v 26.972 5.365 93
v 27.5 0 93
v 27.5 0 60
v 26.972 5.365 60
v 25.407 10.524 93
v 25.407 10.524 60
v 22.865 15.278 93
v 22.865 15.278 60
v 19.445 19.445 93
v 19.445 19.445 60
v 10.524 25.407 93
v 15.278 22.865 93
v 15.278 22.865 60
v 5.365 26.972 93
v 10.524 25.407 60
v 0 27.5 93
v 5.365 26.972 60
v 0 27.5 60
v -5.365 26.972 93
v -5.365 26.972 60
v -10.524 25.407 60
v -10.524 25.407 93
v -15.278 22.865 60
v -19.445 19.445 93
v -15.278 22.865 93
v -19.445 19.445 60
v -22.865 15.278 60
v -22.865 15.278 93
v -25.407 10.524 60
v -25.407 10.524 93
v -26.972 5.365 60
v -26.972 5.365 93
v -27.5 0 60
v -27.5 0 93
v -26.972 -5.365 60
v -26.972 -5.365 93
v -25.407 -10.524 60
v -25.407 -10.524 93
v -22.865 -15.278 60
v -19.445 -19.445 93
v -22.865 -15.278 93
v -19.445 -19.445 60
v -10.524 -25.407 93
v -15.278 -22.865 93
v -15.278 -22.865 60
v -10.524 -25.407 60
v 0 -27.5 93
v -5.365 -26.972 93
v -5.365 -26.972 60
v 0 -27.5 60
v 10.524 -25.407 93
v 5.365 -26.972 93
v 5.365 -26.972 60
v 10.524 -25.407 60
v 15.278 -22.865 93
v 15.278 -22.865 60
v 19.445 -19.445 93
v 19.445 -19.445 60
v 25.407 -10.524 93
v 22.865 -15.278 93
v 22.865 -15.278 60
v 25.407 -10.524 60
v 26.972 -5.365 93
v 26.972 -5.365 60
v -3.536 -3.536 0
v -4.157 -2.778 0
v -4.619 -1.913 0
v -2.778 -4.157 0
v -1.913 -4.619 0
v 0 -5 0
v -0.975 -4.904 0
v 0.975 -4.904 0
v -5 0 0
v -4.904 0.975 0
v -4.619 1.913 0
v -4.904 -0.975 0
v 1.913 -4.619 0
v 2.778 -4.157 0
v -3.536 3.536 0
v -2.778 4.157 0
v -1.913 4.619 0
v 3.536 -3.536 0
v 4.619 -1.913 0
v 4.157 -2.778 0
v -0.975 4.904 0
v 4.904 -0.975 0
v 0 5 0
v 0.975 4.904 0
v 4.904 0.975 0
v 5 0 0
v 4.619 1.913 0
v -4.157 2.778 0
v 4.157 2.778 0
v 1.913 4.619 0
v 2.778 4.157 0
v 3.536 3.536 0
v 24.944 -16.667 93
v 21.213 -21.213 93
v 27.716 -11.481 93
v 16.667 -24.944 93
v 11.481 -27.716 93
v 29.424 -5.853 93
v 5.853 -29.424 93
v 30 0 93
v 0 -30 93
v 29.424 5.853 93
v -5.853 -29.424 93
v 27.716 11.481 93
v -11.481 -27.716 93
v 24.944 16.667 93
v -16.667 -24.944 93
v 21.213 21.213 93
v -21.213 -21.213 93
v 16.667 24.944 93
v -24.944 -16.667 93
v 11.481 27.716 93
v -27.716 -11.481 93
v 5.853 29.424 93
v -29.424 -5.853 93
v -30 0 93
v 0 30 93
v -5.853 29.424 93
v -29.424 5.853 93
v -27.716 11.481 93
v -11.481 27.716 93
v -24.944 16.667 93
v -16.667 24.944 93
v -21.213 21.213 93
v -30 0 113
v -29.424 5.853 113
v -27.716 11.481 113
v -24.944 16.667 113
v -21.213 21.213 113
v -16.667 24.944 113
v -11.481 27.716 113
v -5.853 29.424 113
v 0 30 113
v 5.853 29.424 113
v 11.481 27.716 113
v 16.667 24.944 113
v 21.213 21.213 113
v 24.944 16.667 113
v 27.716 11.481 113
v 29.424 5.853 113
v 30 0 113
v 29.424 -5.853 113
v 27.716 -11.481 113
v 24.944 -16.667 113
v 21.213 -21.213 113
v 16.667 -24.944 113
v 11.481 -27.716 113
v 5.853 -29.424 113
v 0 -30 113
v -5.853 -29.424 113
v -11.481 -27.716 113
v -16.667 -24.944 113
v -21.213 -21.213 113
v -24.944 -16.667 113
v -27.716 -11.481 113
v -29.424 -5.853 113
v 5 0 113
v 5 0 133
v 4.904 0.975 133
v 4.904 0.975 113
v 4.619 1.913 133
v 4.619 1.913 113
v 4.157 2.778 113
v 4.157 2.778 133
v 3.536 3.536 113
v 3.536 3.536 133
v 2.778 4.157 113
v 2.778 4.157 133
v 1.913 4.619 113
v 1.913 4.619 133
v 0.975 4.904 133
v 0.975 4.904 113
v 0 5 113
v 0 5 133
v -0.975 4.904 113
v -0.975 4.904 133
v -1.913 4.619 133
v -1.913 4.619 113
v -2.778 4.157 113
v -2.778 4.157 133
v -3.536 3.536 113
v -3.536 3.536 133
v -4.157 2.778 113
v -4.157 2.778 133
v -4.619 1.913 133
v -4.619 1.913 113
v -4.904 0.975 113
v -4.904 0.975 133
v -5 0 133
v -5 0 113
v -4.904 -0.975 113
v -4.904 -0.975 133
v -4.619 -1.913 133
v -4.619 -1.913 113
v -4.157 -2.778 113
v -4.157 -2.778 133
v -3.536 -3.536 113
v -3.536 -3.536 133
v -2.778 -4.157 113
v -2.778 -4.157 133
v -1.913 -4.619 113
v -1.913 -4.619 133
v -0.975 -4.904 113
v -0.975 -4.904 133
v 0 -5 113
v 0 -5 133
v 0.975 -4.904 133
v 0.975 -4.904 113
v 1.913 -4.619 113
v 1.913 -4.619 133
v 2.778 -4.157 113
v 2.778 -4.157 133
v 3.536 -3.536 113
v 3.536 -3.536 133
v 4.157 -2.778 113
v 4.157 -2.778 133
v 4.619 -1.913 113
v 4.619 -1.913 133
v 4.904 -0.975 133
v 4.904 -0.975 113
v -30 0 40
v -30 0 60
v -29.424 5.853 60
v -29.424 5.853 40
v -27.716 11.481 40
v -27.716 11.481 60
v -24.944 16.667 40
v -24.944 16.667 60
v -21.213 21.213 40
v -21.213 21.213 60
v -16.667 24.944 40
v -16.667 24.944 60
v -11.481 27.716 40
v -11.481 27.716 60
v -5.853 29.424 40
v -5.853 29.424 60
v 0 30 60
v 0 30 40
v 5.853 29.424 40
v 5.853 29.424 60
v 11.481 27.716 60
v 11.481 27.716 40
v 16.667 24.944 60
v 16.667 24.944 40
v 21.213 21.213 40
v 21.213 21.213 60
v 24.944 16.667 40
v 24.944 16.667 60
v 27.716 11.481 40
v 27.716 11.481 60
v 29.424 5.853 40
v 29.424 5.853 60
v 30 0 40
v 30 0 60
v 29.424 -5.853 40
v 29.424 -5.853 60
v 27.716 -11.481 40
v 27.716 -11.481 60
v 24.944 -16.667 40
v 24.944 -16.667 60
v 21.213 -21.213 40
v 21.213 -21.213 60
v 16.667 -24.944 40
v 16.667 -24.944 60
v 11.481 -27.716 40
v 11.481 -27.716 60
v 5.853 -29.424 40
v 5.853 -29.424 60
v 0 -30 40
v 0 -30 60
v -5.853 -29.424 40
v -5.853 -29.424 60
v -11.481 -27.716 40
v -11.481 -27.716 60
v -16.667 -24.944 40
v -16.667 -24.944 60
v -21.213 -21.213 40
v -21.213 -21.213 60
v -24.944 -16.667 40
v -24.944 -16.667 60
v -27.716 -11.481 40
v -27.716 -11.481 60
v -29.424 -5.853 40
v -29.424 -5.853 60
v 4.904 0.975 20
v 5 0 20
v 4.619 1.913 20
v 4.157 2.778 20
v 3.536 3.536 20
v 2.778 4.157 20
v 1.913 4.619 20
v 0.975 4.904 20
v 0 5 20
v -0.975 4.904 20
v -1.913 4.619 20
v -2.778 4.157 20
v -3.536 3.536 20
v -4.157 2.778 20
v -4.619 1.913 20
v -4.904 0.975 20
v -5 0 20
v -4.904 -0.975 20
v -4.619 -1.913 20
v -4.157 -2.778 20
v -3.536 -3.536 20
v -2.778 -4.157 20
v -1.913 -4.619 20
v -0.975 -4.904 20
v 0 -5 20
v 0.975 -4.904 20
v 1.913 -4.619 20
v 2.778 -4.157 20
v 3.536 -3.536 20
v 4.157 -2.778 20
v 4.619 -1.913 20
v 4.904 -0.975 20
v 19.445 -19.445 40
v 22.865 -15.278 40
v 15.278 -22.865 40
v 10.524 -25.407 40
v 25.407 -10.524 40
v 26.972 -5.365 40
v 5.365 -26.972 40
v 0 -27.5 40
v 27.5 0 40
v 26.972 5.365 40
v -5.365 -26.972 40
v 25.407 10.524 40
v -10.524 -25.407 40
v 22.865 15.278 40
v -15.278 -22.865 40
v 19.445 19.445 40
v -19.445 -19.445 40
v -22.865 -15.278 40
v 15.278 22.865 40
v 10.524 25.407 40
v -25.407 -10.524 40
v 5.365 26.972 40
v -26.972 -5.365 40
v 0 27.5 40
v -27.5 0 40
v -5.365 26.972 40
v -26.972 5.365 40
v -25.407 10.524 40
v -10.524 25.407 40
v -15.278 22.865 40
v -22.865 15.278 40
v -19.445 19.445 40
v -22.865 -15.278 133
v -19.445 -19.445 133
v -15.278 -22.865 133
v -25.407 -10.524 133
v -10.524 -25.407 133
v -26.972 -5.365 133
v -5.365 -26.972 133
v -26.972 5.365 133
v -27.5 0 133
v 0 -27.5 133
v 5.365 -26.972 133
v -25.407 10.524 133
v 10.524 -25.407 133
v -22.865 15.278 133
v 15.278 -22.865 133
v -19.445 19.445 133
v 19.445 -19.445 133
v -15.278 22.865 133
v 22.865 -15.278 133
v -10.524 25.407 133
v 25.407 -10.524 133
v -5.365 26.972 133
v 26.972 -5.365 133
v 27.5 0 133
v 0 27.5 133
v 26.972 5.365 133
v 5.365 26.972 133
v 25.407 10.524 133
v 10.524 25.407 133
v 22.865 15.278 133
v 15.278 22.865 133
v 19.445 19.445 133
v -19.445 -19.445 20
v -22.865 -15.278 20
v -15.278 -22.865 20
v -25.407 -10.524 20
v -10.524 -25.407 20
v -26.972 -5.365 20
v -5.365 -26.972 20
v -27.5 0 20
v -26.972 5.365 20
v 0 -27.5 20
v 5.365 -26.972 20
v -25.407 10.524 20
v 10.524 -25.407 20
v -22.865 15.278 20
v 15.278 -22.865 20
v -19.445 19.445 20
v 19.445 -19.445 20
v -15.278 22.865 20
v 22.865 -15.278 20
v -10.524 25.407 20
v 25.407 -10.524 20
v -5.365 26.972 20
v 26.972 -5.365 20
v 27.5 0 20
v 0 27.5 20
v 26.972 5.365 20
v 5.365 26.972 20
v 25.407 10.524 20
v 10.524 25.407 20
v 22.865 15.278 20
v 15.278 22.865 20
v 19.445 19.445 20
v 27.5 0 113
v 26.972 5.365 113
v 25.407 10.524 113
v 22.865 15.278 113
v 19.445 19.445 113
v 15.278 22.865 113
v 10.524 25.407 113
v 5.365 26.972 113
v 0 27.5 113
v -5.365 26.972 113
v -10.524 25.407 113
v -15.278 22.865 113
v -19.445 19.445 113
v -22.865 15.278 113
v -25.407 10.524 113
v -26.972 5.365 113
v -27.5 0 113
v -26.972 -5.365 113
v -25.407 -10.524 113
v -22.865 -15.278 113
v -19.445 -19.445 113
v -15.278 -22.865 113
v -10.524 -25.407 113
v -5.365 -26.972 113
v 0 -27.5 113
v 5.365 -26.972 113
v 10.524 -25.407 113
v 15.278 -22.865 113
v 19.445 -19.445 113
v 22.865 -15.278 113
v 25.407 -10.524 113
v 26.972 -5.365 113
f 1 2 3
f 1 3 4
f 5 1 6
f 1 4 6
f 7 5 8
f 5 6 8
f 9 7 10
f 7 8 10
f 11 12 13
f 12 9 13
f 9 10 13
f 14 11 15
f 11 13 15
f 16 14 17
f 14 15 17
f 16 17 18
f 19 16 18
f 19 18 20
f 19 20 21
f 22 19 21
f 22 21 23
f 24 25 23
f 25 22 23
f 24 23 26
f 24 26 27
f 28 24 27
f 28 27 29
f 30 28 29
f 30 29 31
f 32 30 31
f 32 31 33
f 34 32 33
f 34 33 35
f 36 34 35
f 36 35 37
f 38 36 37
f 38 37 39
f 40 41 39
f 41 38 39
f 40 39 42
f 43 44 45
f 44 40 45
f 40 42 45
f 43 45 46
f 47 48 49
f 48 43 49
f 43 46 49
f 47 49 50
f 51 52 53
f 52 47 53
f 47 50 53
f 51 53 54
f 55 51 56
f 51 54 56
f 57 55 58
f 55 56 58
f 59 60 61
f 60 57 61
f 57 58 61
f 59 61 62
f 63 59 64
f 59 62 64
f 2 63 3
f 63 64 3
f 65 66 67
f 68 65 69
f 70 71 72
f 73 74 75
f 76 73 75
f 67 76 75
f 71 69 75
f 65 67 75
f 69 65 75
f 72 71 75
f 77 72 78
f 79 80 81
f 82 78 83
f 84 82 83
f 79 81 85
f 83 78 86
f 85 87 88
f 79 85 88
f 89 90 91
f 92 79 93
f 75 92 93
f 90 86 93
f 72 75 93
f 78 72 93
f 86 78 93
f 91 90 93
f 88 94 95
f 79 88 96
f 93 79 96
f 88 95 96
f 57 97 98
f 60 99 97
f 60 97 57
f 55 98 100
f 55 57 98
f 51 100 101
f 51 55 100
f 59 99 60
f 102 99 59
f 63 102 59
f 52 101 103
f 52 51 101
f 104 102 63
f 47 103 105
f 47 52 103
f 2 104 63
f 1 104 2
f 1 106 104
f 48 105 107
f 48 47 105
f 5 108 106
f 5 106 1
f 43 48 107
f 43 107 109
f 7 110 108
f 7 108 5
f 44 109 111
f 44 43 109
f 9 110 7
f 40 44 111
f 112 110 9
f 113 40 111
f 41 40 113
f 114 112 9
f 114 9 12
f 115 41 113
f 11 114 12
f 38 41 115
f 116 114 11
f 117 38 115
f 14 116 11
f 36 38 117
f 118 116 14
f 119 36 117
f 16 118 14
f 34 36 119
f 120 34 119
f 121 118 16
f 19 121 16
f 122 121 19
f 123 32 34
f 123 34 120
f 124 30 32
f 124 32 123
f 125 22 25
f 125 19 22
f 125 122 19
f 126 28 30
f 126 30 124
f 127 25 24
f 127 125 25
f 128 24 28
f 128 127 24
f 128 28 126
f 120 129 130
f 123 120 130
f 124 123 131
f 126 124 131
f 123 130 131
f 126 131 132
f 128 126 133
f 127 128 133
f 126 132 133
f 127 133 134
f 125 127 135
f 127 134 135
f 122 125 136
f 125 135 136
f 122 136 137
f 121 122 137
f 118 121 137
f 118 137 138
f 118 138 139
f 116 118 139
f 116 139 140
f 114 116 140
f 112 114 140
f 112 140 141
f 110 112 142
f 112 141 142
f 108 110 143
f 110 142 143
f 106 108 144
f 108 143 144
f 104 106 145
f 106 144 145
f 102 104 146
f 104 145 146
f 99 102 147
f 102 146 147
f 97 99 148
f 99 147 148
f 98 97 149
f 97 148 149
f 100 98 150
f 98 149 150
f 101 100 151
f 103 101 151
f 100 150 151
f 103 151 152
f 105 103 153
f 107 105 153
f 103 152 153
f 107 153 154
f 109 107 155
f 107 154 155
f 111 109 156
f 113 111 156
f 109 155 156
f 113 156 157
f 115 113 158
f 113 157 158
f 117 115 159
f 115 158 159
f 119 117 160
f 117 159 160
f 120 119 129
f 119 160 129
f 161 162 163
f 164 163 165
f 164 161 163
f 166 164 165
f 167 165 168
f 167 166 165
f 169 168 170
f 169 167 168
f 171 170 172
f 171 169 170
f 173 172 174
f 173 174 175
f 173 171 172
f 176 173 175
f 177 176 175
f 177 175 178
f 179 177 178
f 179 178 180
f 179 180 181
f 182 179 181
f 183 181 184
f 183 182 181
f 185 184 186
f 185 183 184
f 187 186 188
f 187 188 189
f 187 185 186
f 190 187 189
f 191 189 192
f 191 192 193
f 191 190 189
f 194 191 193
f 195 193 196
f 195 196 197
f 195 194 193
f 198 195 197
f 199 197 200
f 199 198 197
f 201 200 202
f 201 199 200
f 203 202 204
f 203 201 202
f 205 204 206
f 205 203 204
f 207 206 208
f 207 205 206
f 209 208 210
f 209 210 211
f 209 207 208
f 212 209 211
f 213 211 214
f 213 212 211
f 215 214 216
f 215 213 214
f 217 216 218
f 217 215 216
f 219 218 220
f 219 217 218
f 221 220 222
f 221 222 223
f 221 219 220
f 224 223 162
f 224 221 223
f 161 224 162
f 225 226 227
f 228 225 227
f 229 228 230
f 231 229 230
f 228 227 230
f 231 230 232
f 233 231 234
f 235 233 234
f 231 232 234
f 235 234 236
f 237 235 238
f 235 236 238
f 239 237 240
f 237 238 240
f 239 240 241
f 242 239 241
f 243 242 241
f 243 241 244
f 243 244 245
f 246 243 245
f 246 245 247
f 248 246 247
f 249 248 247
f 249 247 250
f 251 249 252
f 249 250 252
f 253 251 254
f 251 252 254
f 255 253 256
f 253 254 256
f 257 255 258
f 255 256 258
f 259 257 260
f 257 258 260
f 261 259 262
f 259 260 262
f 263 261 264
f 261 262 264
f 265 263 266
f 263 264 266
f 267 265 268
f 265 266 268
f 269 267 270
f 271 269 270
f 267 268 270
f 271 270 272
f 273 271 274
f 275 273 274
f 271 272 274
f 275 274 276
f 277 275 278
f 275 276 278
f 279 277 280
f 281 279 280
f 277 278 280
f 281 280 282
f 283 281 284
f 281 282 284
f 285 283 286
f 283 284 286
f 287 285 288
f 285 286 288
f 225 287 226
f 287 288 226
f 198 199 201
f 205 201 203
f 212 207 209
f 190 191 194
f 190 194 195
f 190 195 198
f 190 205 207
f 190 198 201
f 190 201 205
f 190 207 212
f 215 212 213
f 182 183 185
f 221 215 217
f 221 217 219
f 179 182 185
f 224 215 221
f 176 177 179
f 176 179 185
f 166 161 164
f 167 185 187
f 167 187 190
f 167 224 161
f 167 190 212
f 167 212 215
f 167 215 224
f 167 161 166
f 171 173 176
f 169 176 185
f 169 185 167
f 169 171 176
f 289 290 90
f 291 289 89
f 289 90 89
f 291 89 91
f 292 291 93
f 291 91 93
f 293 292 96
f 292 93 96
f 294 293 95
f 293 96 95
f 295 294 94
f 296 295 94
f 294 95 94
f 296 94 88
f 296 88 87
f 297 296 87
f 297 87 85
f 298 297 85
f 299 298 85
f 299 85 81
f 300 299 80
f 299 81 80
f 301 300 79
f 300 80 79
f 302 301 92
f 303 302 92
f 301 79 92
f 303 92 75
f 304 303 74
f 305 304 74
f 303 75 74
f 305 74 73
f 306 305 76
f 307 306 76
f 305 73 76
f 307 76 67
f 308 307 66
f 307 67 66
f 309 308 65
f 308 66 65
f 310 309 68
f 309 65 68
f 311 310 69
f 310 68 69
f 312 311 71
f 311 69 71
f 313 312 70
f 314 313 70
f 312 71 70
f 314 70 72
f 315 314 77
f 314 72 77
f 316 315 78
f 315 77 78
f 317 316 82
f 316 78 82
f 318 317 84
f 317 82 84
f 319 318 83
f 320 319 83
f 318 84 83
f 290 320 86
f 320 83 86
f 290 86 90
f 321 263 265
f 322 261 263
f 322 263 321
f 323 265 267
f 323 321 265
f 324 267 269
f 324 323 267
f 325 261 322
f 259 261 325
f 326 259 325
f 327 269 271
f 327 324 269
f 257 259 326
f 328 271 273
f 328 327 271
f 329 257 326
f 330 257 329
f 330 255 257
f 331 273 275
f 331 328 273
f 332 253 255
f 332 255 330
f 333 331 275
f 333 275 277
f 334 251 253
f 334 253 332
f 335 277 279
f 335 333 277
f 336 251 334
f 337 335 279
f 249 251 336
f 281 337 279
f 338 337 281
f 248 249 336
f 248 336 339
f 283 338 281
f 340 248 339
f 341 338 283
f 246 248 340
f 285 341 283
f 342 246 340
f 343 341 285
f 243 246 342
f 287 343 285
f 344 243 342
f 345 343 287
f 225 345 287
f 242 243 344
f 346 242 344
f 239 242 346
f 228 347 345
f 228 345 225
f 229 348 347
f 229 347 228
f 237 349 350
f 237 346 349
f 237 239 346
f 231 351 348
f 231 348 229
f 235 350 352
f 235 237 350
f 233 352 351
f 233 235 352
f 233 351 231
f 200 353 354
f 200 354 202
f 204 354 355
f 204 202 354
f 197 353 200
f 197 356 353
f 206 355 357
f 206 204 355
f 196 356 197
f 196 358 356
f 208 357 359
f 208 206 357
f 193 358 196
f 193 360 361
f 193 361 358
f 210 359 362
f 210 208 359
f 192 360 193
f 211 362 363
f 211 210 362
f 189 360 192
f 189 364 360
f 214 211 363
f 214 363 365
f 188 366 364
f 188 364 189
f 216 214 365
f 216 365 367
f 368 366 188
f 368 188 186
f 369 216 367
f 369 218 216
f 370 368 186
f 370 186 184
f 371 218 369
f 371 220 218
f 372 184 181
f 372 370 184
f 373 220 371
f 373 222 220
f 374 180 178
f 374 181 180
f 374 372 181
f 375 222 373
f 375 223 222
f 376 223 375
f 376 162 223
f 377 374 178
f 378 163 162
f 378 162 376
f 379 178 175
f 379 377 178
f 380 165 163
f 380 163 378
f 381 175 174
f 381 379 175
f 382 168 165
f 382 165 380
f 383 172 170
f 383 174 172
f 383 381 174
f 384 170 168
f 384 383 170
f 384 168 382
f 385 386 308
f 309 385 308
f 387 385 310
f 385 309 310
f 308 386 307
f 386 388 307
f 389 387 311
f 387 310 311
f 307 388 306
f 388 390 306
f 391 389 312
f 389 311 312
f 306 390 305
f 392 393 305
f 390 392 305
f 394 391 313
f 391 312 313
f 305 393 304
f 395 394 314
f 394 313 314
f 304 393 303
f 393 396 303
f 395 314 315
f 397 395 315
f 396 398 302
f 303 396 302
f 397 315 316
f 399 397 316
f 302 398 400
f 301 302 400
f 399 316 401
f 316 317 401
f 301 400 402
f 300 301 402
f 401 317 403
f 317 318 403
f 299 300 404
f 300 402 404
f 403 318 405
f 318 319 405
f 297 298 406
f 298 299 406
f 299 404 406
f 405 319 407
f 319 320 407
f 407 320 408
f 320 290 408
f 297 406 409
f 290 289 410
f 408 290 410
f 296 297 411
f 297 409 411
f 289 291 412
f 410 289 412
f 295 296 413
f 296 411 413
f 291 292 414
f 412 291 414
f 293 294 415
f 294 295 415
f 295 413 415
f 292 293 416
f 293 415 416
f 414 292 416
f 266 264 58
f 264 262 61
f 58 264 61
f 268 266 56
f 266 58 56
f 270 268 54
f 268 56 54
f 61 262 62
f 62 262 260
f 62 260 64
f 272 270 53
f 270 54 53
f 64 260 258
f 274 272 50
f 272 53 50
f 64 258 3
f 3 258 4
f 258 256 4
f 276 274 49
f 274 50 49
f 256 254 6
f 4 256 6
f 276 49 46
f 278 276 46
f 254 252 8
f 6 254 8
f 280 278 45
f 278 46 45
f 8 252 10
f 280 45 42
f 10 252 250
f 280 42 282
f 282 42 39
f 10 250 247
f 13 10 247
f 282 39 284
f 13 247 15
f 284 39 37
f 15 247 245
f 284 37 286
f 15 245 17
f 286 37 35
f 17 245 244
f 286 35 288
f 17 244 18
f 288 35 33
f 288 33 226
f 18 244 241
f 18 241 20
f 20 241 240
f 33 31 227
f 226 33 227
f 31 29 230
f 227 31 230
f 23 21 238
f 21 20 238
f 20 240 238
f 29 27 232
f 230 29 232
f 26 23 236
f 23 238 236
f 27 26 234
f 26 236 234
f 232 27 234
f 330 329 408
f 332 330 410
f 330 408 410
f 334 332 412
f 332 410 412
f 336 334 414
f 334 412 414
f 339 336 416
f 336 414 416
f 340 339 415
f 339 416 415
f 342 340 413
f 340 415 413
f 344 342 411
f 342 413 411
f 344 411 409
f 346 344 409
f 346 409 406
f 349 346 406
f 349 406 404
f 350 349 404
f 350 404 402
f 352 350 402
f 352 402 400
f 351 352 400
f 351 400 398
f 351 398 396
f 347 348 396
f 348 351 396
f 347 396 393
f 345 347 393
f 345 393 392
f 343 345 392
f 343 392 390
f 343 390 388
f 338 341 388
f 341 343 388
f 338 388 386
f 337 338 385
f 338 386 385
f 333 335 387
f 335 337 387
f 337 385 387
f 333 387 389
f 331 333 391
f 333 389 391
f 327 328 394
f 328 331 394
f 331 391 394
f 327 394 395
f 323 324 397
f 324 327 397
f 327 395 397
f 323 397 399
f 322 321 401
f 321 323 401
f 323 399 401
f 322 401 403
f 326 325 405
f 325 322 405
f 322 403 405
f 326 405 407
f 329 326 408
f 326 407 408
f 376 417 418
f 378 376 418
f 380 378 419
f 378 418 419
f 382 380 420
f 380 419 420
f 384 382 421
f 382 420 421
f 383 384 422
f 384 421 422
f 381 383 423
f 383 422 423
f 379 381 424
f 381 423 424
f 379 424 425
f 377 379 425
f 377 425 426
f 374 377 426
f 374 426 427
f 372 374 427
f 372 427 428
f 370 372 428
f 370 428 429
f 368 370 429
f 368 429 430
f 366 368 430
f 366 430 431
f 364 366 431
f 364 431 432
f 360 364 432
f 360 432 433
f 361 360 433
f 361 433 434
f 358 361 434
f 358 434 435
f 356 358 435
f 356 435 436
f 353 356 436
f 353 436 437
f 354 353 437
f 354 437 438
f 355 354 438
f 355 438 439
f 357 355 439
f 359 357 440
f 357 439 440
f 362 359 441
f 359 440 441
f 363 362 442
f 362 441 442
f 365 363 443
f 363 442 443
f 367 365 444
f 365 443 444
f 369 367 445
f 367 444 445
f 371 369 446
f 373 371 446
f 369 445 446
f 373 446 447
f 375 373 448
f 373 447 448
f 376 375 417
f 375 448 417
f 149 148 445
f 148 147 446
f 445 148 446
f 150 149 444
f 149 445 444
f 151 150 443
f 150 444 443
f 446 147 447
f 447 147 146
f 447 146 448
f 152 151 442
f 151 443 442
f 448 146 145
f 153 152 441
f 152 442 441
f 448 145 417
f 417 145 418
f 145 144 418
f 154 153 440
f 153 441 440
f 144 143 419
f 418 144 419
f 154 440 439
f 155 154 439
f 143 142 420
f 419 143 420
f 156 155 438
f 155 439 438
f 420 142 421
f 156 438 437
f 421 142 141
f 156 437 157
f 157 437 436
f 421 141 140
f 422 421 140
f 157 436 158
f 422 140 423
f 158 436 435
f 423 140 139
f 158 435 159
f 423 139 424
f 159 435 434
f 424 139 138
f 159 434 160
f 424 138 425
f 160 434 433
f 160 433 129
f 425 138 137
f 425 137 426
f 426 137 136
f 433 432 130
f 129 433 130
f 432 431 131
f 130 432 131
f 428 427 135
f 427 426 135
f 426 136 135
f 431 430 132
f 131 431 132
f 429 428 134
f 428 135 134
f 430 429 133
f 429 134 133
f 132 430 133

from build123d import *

# Parameters (mm, degrees)
SKETCH1_R                = 5
BOSS_EXTRUDE1_DEPTH      = 20
SKETCH2_R                = 27.5
BOSS_EXTRUDE2_DEPTH      = 113
BOSS_EXTRUDE3_DEPTH      = 10
BOSS_EXTRUDE3_DEPTH_BACK = 10
SKETCH3_R                = 30
BOSS_EXTRUDE4_DEPTH      = 10
BOSS_EXTRUDE4_DEPTH_BACK = 10
SKETCH4_R                = 30
CUT_EXTRUDE1_START       = -20
SKETCH5_R                = 5
CUT_EXTRUDE1_DEPTH       = 20


with BuildPart() as part:
    # Sketch1 → Boss-Extrude1 (new body)
    with BuildSketch(Plane.XY):
        Circle(SKETCH1_R)
    extrude(amount=BOSS_EXTRUDE1_DEPTH)

    # Sketch2 → Boss-Extrude2 (add)
    with BuildSketch(Plane.XY.offset(20)):
        Circle(SKETCH2_R)
    extrude(amount=BOSS_EXTRUDE2_DEPTH)

    # Sketch3 → Boss-Extrude3 (add, two sides: drawn at the far end of the back side and taken through both)
    with BuildSketch(Plane(origin=(0, 0, 50), x_dir=(-1, 0, 0), z_dir=(0, 0, -1)).offset(-BOSS_EXTRUDE3_DEPTH_BACK)):
        Circle(SKETCH3_R)
    extrude(amount=BOSS_EXTRUDE3_DEPTH + BOSS_EXTRUDE3_DEPTH_BACK)

    # Sketch4 → Boss-Extrude4 (add, two sides: drawn at the far end of the back side and taken through both)
    with BuildSketch(Plane(origin=(0, 0, 103), x_dir=(-1, 0, 0), z_dir=(0, 0, -1)).offset(-BOSS_EXTRUDE4_DEPTH_BACK)):
        Circle(SKETCH4_R)
    extrude(amount=BOSS_EXTRUDE4_DEPTH + BOSS_EXTRUDE4_DEPTH_BACK)

    # Sketch5 → Cut-Extrude1 (cut)
    with BuildSketch(Plane.XY.offset(133).offset(CUT_EXTRUDE1_START)):
        Circle(SKETCH5_R)
    extrude(amount=CUT_EXTRUDE1_DEPTH, mode=Mode.SUBTRACT)


solid = part.part
